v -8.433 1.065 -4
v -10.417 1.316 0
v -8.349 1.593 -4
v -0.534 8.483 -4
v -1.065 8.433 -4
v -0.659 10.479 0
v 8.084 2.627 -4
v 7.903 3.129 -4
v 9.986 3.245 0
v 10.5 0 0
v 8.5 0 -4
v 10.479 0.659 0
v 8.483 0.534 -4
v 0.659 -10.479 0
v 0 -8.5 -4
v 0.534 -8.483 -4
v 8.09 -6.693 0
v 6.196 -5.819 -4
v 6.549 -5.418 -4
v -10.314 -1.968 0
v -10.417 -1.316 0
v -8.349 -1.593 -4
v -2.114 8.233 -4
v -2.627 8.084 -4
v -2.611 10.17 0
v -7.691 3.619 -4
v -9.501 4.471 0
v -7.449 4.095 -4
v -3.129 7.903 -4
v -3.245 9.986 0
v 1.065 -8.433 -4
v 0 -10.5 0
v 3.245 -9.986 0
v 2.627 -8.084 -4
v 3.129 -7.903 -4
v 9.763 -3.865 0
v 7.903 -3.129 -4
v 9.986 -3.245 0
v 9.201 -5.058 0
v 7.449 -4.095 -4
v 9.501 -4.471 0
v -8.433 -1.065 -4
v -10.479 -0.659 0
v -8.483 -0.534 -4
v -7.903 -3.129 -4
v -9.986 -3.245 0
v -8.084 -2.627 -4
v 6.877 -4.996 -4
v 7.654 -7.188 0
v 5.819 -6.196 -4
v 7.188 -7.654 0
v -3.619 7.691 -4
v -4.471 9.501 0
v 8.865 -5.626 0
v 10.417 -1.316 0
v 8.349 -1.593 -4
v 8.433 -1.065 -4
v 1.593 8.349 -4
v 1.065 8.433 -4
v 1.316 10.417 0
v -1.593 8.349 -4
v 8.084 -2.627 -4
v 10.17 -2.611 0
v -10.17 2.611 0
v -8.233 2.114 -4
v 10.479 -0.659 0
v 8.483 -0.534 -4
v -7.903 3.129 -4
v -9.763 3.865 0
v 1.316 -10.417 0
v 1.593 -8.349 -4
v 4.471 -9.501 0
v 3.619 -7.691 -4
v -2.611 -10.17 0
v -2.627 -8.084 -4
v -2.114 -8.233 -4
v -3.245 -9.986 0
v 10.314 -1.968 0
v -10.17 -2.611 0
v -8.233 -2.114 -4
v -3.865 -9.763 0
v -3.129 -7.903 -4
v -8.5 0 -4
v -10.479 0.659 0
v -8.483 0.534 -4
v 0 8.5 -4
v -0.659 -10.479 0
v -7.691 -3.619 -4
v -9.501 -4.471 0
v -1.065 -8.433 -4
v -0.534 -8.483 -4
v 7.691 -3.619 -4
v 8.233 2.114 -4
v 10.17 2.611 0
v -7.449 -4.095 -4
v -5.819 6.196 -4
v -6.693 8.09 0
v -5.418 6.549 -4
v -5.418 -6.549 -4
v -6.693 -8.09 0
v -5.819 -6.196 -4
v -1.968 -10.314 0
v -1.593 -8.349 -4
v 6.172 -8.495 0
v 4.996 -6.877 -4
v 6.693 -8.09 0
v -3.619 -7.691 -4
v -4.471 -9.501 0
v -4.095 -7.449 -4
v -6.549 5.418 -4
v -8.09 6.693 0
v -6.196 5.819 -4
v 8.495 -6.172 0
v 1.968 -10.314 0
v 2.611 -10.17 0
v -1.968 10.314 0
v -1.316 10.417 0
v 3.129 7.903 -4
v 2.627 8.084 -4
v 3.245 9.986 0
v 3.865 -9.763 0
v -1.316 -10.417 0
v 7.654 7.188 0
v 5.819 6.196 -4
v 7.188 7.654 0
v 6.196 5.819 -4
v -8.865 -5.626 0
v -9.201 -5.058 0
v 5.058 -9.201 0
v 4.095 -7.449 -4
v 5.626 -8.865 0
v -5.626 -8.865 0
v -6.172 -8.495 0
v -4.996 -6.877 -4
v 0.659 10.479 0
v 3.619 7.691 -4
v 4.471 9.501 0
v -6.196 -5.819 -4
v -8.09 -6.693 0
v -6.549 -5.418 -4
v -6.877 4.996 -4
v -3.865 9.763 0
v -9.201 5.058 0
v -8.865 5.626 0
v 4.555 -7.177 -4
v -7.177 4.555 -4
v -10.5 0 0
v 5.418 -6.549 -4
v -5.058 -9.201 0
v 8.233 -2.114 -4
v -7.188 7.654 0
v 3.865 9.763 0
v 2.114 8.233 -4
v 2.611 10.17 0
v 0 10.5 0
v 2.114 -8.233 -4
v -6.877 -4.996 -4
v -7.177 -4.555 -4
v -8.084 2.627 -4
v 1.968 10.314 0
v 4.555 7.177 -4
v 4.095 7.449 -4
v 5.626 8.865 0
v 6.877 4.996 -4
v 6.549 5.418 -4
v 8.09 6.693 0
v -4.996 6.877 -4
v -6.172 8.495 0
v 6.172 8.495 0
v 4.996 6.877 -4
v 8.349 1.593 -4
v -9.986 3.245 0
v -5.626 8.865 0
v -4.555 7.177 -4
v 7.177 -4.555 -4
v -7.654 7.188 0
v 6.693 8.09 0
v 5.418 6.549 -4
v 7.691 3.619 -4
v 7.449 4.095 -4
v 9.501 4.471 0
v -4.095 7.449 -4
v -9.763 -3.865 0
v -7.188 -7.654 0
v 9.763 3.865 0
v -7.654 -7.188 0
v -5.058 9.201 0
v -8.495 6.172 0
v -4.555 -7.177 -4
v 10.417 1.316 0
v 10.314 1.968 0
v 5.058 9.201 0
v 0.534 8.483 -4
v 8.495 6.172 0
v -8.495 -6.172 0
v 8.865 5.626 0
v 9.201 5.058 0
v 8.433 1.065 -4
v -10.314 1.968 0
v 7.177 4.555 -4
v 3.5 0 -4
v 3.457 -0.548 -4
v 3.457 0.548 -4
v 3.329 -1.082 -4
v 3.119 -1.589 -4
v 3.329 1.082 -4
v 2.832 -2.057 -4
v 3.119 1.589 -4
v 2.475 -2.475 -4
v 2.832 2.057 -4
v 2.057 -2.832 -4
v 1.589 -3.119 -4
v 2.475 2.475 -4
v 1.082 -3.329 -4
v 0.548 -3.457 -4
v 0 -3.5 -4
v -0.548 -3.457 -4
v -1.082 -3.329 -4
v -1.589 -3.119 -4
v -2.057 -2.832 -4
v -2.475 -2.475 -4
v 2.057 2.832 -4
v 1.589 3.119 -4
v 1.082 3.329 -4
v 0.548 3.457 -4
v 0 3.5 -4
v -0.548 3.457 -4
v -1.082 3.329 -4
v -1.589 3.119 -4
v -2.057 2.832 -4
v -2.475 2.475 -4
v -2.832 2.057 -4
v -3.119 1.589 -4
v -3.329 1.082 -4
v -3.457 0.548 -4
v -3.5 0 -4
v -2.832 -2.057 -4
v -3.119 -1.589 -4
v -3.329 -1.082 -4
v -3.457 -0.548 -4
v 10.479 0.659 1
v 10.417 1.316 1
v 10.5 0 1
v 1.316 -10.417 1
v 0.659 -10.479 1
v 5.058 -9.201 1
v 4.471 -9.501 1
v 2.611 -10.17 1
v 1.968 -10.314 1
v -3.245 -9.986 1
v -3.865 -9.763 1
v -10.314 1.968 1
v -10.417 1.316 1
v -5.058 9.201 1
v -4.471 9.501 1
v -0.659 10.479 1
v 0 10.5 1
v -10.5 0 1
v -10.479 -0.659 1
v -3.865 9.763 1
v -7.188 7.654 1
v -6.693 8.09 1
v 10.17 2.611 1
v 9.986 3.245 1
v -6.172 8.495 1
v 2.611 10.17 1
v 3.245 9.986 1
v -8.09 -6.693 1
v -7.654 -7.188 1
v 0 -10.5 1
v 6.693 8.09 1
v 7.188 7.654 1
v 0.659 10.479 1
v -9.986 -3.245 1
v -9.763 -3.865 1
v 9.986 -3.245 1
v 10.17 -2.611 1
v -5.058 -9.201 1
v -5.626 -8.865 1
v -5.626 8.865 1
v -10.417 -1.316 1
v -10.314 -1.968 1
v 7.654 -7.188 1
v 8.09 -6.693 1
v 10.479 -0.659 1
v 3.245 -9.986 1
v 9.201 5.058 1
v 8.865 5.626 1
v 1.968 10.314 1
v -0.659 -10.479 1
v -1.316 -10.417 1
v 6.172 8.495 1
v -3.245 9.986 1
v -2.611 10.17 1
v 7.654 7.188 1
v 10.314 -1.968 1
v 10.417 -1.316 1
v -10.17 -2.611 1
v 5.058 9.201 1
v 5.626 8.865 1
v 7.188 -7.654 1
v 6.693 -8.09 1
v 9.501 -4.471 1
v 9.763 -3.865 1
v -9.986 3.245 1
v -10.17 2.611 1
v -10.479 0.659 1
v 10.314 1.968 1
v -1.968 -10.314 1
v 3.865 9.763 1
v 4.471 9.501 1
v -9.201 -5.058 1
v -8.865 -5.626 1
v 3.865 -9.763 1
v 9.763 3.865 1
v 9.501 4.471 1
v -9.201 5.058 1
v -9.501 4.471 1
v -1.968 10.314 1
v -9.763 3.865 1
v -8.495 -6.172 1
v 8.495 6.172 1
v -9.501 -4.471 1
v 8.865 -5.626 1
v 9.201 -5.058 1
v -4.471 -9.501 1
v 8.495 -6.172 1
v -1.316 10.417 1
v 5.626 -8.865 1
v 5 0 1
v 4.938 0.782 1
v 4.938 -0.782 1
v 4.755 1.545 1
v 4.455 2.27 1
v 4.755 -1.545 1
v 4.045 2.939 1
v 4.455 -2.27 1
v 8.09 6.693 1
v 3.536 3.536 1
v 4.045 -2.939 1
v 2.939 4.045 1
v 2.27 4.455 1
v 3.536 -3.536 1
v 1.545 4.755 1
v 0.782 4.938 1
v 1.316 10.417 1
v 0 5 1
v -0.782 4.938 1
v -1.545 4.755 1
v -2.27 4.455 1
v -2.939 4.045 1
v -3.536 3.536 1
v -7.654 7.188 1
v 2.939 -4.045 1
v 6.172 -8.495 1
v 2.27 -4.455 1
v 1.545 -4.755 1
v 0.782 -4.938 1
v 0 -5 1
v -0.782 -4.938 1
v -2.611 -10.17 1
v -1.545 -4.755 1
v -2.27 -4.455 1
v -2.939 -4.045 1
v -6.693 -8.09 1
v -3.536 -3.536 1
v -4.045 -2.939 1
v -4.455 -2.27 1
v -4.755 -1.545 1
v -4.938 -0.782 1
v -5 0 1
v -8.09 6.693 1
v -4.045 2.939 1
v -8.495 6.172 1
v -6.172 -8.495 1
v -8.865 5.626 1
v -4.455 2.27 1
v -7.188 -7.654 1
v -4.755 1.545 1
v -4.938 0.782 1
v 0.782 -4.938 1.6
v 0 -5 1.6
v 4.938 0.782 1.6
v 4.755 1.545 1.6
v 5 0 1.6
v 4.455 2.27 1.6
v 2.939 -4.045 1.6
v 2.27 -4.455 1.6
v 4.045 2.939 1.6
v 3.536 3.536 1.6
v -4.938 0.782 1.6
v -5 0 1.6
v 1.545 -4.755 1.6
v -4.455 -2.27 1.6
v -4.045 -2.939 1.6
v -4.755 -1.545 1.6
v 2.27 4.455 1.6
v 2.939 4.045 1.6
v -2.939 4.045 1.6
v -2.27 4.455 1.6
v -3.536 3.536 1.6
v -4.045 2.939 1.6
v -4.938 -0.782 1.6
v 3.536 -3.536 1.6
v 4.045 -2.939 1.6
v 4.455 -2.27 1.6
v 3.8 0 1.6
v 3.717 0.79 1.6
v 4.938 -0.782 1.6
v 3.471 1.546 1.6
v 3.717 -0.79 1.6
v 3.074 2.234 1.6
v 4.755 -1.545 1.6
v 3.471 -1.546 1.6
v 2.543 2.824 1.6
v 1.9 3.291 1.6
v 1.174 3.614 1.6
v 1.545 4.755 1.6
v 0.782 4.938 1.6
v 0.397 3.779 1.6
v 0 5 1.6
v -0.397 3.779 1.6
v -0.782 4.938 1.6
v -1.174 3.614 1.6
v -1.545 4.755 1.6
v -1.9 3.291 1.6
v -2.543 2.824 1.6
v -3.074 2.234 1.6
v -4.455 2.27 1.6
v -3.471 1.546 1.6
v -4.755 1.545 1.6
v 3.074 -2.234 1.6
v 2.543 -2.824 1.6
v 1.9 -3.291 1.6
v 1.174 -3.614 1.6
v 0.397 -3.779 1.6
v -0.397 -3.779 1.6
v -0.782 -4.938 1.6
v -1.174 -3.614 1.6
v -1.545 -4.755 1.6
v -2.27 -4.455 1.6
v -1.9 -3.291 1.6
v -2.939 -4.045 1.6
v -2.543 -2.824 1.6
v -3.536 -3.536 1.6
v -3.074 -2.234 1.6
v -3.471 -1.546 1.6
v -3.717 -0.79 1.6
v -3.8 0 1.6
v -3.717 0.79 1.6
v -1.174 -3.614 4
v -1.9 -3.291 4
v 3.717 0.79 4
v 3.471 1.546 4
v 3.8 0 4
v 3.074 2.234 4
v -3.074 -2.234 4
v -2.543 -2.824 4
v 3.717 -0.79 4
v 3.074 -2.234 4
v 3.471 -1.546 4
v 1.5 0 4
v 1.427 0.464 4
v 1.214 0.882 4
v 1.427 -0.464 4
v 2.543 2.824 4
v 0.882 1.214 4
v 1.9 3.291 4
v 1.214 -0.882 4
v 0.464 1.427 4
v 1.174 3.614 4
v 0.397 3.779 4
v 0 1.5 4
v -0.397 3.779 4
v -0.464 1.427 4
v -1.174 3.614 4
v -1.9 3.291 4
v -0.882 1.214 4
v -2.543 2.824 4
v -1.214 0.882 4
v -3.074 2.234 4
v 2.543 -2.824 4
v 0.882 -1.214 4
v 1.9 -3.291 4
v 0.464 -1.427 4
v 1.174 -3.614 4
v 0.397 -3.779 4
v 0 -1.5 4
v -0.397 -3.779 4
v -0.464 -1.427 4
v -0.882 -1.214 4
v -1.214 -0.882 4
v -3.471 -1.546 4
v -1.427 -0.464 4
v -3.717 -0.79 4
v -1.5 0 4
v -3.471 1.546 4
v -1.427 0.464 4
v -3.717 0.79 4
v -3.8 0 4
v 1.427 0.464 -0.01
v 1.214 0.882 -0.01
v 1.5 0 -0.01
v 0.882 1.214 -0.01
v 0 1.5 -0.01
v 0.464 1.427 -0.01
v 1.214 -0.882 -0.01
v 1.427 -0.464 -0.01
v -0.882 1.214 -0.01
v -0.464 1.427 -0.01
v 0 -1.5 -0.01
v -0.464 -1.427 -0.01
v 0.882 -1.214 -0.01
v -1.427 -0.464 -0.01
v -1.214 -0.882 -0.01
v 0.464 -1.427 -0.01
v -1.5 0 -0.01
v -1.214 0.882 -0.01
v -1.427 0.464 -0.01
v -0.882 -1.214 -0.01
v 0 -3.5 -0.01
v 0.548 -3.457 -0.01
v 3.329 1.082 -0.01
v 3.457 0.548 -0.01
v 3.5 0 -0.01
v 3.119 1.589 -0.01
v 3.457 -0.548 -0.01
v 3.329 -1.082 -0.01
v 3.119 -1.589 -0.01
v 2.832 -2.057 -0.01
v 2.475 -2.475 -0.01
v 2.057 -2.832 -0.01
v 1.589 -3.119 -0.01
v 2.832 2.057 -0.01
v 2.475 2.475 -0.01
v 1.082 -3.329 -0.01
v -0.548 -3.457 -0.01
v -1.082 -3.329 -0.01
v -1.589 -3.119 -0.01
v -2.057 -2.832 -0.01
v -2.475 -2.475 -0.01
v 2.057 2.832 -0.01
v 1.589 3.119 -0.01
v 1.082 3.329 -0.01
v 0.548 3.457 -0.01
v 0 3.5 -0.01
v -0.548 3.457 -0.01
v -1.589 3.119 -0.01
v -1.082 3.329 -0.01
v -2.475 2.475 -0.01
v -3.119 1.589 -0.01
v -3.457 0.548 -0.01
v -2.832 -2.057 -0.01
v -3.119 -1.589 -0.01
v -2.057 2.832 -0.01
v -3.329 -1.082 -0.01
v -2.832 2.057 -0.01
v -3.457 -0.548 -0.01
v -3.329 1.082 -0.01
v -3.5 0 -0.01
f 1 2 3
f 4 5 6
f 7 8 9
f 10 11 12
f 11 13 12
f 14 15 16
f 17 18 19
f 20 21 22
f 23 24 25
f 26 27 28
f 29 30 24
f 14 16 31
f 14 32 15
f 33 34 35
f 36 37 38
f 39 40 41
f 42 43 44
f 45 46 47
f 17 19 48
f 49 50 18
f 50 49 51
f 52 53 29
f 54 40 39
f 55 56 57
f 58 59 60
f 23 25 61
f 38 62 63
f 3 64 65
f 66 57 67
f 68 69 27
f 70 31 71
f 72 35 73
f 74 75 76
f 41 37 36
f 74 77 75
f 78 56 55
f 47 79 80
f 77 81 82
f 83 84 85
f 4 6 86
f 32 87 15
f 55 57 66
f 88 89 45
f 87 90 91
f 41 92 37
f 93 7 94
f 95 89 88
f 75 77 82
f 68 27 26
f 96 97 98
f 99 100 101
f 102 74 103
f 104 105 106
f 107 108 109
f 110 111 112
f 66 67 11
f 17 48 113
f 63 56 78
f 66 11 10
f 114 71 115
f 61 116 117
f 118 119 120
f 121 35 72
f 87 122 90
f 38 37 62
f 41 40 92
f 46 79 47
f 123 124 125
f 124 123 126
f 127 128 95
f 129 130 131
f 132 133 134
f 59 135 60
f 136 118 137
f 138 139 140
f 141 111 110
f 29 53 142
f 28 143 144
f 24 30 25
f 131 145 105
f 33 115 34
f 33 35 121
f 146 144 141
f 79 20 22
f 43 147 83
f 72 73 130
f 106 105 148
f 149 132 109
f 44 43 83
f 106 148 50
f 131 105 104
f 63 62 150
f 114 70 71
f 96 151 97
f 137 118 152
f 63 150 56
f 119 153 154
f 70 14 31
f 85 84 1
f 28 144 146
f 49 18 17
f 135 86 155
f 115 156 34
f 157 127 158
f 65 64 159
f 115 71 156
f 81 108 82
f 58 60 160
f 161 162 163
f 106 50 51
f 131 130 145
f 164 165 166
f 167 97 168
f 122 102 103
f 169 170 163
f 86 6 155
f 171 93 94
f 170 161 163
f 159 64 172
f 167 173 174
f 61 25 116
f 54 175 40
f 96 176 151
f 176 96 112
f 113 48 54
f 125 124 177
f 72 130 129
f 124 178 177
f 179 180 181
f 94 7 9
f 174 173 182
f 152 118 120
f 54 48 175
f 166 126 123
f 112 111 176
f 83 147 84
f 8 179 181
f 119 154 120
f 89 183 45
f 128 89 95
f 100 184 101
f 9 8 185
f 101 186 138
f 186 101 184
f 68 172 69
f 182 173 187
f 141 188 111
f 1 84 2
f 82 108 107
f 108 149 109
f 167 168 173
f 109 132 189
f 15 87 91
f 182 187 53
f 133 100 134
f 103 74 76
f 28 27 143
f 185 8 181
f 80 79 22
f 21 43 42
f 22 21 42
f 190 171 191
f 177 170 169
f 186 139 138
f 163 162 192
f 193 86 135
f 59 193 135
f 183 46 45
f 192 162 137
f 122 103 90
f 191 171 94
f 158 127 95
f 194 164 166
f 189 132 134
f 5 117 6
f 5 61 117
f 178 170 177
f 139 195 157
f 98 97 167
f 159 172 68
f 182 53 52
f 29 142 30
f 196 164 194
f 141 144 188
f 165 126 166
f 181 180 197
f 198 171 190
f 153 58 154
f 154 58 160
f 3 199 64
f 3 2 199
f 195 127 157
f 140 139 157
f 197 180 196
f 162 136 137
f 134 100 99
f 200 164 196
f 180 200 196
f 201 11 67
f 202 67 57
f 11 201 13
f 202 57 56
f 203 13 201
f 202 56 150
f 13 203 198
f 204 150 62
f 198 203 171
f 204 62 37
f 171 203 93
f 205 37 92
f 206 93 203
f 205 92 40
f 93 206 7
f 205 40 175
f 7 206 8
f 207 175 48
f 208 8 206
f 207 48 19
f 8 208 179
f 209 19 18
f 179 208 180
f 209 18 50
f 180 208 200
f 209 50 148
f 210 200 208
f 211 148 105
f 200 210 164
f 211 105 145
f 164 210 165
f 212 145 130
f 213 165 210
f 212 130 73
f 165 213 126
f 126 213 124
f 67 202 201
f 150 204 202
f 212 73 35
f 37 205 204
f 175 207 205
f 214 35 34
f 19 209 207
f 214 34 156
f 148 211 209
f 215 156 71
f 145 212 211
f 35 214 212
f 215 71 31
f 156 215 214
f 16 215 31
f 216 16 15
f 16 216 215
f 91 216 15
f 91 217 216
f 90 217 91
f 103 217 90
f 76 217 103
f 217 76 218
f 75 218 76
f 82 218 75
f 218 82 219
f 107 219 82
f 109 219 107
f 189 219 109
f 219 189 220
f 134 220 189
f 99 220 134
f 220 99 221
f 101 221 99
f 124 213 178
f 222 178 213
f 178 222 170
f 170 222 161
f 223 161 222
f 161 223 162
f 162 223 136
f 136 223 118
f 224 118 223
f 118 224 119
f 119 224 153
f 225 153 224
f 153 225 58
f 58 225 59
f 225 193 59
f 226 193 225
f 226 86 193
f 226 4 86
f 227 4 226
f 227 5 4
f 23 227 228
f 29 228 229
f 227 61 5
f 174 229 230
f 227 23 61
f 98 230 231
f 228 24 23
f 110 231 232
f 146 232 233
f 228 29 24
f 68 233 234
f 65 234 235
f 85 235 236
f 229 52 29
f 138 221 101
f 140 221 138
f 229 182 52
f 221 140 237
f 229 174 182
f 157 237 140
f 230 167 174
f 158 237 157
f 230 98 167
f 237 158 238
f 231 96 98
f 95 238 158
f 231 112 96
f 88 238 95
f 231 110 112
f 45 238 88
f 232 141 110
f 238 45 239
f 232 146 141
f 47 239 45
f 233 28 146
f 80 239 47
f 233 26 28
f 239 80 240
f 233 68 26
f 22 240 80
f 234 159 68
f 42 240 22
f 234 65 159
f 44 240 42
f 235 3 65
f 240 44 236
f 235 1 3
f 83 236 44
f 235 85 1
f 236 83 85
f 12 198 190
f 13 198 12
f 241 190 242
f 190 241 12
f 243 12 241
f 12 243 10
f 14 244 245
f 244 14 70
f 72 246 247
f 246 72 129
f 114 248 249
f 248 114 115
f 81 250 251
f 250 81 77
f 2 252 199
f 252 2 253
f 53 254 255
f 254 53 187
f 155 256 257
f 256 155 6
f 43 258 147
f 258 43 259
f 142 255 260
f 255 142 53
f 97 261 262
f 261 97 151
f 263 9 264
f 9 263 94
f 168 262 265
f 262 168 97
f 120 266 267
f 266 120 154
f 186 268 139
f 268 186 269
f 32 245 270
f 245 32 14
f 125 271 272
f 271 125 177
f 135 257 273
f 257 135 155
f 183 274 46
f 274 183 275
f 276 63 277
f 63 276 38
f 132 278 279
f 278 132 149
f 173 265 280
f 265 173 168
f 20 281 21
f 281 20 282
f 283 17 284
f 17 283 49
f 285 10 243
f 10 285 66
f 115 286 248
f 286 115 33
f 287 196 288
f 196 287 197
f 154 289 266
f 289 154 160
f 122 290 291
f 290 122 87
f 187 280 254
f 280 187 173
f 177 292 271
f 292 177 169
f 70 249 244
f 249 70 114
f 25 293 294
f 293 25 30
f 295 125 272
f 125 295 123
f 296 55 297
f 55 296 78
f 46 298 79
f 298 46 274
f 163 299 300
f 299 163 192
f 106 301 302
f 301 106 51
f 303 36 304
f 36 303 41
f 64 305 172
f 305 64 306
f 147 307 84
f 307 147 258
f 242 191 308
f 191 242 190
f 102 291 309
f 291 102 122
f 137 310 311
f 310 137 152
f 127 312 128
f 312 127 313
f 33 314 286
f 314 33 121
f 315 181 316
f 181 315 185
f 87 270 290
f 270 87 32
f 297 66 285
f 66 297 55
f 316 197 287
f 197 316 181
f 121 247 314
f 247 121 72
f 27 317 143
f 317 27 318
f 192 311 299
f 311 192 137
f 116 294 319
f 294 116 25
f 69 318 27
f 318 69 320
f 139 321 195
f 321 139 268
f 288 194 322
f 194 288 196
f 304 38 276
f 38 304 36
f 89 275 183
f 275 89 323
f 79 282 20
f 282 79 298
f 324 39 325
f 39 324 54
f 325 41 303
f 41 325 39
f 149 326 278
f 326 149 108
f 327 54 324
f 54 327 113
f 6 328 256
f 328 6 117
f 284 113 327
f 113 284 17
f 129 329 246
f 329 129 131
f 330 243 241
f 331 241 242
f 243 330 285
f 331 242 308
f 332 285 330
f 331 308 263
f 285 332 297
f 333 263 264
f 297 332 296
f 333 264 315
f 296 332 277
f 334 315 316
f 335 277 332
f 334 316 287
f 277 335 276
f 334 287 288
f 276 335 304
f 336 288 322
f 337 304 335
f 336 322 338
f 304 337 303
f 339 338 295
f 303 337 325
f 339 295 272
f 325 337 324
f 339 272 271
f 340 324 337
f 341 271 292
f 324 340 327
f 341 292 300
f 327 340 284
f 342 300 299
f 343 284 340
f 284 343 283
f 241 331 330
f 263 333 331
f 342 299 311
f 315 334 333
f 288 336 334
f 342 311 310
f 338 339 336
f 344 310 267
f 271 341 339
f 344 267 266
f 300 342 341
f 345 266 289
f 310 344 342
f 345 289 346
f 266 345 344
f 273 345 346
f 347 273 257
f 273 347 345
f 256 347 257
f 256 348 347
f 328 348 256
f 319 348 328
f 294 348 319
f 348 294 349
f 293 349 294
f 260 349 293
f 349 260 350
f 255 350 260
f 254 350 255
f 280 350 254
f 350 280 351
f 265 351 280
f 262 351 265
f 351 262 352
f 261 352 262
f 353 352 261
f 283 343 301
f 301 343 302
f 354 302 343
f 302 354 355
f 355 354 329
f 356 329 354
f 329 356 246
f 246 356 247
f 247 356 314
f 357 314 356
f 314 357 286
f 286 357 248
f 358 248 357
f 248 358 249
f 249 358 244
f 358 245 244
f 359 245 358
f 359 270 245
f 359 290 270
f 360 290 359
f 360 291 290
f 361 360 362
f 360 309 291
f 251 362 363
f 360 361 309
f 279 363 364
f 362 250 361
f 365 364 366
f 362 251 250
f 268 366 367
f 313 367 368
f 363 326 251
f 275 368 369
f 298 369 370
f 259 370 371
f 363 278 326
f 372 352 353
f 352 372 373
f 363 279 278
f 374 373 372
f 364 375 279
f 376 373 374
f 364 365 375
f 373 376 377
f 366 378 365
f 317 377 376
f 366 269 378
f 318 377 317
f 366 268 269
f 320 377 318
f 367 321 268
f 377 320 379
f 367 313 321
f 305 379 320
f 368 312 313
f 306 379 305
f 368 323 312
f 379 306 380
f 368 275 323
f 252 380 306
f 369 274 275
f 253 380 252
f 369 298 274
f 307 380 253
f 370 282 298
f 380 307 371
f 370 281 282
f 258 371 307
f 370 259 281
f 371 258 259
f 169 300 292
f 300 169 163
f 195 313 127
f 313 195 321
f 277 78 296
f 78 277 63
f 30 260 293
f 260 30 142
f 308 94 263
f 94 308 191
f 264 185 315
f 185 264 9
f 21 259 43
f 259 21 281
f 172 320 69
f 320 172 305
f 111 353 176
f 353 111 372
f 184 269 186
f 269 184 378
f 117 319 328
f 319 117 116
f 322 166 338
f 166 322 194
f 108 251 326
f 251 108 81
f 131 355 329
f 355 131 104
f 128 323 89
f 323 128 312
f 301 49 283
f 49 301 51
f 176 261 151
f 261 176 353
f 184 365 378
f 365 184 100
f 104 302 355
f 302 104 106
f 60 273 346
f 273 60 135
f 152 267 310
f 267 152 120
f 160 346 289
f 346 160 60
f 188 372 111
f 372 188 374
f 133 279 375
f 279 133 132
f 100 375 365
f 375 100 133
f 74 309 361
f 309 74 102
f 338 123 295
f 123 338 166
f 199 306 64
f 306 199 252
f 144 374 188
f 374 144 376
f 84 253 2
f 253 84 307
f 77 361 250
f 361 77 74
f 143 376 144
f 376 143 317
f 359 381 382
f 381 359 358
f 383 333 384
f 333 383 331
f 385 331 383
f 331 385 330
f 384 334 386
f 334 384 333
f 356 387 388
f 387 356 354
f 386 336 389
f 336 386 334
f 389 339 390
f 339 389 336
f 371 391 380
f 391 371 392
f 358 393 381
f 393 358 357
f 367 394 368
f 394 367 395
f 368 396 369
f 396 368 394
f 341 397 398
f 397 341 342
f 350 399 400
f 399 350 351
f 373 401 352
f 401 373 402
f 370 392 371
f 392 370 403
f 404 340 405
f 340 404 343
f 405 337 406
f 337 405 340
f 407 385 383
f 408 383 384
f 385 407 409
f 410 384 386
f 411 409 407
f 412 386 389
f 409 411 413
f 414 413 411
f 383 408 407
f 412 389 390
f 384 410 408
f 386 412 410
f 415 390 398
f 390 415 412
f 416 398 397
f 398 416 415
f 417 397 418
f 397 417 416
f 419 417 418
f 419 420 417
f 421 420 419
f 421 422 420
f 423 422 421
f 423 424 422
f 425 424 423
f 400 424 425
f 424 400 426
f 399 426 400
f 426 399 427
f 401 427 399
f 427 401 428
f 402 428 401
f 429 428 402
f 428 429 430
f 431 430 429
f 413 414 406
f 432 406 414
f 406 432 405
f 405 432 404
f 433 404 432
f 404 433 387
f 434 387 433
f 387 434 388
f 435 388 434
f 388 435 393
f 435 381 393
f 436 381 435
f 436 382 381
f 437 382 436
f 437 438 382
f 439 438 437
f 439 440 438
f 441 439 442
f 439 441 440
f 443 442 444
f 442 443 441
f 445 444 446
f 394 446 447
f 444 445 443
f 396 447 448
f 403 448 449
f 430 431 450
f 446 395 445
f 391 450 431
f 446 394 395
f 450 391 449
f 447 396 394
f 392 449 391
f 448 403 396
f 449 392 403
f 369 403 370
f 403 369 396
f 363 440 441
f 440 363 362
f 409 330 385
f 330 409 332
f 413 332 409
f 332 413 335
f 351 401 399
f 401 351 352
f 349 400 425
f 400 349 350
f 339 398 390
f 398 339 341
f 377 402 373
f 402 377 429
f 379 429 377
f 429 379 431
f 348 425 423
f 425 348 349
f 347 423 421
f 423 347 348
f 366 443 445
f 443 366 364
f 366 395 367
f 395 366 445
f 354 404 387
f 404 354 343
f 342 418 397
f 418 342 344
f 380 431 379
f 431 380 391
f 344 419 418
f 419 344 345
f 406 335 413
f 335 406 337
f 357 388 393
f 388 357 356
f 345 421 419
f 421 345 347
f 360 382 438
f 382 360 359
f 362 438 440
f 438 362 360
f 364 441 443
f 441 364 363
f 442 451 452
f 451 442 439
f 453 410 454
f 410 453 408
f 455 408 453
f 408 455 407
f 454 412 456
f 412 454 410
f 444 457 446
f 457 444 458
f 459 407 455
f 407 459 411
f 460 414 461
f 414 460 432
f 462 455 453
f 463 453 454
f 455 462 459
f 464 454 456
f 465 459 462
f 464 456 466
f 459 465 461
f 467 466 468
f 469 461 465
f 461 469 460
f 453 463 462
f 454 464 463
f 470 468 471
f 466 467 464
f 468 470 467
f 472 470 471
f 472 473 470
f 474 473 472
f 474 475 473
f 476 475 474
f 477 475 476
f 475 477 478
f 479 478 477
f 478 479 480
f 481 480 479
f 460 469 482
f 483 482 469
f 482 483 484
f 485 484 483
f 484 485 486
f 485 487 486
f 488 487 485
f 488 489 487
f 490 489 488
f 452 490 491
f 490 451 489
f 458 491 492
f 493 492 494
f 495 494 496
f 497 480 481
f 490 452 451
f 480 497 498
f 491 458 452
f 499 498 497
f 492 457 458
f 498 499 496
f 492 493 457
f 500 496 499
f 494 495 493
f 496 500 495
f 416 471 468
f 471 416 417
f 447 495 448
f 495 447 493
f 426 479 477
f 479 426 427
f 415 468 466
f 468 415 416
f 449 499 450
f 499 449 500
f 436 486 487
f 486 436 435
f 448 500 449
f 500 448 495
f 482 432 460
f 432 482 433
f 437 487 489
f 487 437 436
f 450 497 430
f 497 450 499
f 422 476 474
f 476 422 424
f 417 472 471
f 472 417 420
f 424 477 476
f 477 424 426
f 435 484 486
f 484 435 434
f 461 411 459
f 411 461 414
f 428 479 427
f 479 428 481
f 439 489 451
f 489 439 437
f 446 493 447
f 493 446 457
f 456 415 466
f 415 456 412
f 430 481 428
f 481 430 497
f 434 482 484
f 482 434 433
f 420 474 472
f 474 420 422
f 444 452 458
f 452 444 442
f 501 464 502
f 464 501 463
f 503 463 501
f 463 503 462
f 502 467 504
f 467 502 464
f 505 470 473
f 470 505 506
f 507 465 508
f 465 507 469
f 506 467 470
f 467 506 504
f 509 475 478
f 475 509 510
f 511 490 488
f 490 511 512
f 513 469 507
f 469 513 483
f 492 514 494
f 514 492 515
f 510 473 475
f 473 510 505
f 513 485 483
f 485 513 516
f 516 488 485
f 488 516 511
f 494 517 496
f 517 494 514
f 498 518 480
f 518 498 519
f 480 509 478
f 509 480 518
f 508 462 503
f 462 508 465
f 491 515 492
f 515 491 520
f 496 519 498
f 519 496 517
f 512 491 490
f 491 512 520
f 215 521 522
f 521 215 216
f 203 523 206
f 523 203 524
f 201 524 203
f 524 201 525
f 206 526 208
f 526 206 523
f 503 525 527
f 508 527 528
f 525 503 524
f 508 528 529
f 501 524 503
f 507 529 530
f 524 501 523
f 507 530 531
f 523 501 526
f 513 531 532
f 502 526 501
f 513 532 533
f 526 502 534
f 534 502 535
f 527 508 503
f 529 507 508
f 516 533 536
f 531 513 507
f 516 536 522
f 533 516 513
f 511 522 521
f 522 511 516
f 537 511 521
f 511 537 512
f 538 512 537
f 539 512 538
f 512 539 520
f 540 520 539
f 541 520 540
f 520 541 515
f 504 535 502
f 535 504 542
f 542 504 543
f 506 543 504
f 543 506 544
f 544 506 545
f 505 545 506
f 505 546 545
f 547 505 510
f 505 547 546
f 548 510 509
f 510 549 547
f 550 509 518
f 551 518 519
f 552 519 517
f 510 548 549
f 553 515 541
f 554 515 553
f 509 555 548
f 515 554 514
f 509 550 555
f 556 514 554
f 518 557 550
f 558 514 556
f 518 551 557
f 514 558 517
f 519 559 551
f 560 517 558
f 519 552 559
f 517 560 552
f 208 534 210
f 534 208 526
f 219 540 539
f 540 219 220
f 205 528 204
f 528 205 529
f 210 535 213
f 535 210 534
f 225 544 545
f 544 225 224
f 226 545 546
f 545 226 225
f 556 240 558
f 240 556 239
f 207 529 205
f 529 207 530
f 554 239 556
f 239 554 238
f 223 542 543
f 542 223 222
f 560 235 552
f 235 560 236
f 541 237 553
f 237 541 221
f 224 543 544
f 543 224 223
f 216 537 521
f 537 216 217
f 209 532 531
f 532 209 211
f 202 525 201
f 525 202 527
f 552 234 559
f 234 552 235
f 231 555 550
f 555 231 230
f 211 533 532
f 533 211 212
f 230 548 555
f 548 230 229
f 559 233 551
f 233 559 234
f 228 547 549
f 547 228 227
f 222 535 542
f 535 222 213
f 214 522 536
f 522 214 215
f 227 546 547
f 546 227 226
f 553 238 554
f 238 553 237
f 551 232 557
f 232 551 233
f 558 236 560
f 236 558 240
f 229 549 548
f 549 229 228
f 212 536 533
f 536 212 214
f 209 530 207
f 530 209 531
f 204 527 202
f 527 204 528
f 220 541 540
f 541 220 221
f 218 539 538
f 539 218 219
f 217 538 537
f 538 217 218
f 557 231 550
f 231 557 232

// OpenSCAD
side="top";
extra=4;
slope=0;
difference(){
  union(){
  translate([0,0,-1*extra]) cylinder(d1=21-(extra*1),d2=21,h=extra,$fn=100);
  cylinder(d=21,h=1,$fn=100);
  cylinder(d=10,h=1.6,$fn=40);
  cylinder(d=7.6,h=4,$fn=30);
  }
  translate([0,0,-0.01-extra]) {
    cylinder(d=3,h=20,$fn=20);
    if(side=="top")
      cylinder(d=7,h=4,$fn=40);
    else
      cylinder(d=6.5,h=3,$fn=6);
    if(slope)
    {
      if(side=="top")
        translate([0,0,4.99]) cylinder(d1=7.5,d2=3,h=extra,$fn=40);
      else
        translate([0,0,2.99]) cylinder(d1=6.5,d2=3,h=3,$fn=6);
    }
  }
}
